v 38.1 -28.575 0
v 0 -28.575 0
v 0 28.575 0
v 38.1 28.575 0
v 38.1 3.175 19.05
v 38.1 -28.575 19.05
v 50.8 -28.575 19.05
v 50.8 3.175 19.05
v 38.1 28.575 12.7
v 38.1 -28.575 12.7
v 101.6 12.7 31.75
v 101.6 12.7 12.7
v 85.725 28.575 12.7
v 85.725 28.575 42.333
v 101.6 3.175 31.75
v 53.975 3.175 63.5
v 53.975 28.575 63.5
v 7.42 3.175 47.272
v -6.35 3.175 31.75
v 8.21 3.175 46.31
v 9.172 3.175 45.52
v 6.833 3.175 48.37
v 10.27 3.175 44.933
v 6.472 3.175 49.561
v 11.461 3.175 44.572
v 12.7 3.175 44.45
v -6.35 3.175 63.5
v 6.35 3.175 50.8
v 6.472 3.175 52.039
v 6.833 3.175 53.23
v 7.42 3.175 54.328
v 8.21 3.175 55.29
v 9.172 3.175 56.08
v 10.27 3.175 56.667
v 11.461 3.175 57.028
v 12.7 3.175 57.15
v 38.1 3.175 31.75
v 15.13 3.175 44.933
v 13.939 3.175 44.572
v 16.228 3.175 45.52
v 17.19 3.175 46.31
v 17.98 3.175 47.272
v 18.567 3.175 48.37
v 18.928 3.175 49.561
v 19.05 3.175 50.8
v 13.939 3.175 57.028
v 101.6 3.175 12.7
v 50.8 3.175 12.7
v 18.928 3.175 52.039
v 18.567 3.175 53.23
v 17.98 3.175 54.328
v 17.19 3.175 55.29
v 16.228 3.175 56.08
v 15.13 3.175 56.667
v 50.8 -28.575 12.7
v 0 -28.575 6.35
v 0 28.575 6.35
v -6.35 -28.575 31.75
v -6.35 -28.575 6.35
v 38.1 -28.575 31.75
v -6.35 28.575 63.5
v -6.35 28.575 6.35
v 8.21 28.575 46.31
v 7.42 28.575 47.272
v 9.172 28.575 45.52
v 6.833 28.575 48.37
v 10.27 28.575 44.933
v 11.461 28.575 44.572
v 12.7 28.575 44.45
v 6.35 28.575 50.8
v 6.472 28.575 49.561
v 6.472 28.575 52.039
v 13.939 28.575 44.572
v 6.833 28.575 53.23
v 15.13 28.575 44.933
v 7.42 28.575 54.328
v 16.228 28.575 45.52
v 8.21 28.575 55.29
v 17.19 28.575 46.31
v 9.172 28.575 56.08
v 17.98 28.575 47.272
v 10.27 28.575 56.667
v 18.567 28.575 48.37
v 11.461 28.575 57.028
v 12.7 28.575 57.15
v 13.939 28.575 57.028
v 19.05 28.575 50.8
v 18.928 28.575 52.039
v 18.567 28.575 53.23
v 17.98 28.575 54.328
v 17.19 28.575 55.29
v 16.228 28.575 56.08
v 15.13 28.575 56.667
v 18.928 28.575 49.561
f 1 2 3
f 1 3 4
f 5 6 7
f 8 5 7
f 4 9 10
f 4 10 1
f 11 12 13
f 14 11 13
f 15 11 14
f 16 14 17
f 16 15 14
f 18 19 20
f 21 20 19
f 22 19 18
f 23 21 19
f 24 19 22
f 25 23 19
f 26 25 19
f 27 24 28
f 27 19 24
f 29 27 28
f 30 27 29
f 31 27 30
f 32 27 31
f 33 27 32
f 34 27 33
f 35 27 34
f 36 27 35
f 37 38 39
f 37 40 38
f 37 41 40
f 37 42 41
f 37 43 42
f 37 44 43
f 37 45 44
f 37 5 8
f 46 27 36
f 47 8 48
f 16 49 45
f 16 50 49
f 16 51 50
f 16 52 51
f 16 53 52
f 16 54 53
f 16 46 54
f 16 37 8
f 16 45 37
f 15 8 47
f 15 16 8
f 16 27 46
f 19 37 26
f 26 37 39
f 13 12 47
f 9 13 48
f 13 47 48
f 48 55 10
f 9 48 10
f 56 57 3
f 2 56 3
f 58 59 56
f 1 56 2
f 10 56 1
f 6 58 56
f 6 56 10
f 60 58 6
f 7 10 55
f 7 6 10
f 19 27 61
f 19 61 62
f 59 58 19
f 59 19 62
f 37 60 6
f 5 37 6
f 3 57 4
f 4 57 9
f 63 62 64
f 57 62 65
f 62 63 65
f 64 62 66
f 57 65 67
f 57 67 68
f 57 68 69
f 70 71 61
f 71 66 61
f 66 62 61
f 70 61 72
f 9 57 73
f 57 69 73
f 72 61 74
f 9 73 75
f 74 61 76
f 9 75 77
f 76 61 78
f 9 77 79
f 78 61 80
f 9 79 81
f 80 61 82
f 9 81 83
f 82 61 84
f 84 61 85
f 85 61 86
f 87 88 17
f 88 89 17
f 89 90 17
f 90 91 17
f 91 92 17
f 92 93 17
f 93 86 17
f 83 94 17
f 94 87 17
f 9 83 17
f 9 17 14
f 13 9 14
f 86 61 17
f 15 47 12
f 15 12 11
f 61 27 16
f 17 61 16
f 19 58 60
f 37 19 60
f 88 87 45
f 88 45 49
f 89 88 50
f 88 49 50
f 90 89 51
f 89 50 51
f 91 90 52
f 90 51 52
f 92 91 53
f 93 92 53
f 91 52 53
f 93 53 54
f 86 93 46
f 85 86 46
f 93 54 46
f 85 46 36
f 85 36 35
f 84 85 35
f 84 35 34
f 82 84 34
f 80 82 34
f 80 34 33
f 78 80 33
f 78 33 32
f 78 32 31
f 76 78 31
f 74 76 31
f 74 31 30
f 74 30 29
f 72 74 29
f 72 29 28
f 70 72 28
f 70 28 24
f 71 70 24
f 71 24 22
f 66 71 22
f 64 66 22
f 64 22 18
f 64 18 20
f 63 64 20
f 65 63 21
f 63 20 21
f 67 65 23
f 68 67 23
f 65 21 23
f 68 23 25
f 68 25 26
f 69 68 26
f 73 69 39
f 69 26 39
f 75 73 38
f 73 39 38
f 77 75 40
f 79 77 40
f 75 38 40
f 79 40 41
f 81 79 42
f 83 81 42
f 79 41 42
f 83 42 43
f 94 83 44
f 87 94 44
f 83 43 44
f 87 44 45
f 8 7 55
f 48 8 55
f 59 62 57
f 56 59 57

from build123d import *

# Parameters (mm, degrees)
F1_DEPTH  = 28.575
F3_DEPTH  = 31.75
F5_DEPTH  = 69.851
F6_R      = 6.35
F7_DEPTH  = 25.401
F9_DEPTH  = 25.401
F11_DEPTH = 25.401


with BuildPart() as f1:
    # F0 (on Front) → F1 (new body, symmetric)
    with BuildSketch(Plane.XZ):
        Polygon((0, 6.35), (0, 0), (101.6, 0), (101.6, 31.75), (44.45, 69.85), (-6.35, 69.85), (-6.35, 6.35), align=None)
    extrude(amount=F1_DEPTH, both=True)

    # F2 (on face) → F3 (cut)
    with BuildSketch(Plane.XZ.offset(28.575)):
        Polygon((38.1, 0), (101.6, 0), (101.6, 31.75), (44.45, 69.85), (-6.35, 69.85), (-6.35, 31.75), (38.1, 31.75), (38.1, 19.05), (50.8, 19.05), (50.8, 12.7), (38.1, 12.7), align=None)
    extrude(amount=-F3_DEPTH, mode=Mode.SUBTRACT)

    # F4 (on face) → F5 (cut, through all)
    with BuildSketch(Plane(origin=(0, 0, 0), x_dir=(1, 0, 0), z_dir=(0, 0, -1))):
        Polygon((85.725, -28.575), (101.6, -28.575), (101.6, -12.7), align=None)
    extrude(amount=-F5_DEPTH, mode=Mode.SUBTRACT)

    # F6 (on face) → F7 (cut, through all)
    with BuildSketch(Plane.XZ.offset(-3.175)):
        with Locations((12.699999, 50.8)):
            Circle(F6_R)
    extrude(amount=-F7_DEPTH, mode=Mode.SUBTRACT)

    # F8 (on face) → F9 (cut, through all)
    with BuildSketch(Plane.XZ.offset(-3.175)):
        Polygon((38.1, 12.7), (38.1, 0), (101.6, 0), (101.6, 12.7), (50.8, 12.7), align=None)
    extrude(amount=-F9_DEPTH, mode=Mode.SUBTRACT)

    # F10 (on face) → F11 (cut, through all)
    with BuildSketch(Plane.XZ.offset(-3.175)):
        Polygon((44.45, 69.85), (-6.35, 69.85), (-6.35, 63.5), (53.975, 63.5), align=None)
    extrude(amount=-F11_DEPTH, mode=Mode.SUBTRACT)


solid = f1.part
